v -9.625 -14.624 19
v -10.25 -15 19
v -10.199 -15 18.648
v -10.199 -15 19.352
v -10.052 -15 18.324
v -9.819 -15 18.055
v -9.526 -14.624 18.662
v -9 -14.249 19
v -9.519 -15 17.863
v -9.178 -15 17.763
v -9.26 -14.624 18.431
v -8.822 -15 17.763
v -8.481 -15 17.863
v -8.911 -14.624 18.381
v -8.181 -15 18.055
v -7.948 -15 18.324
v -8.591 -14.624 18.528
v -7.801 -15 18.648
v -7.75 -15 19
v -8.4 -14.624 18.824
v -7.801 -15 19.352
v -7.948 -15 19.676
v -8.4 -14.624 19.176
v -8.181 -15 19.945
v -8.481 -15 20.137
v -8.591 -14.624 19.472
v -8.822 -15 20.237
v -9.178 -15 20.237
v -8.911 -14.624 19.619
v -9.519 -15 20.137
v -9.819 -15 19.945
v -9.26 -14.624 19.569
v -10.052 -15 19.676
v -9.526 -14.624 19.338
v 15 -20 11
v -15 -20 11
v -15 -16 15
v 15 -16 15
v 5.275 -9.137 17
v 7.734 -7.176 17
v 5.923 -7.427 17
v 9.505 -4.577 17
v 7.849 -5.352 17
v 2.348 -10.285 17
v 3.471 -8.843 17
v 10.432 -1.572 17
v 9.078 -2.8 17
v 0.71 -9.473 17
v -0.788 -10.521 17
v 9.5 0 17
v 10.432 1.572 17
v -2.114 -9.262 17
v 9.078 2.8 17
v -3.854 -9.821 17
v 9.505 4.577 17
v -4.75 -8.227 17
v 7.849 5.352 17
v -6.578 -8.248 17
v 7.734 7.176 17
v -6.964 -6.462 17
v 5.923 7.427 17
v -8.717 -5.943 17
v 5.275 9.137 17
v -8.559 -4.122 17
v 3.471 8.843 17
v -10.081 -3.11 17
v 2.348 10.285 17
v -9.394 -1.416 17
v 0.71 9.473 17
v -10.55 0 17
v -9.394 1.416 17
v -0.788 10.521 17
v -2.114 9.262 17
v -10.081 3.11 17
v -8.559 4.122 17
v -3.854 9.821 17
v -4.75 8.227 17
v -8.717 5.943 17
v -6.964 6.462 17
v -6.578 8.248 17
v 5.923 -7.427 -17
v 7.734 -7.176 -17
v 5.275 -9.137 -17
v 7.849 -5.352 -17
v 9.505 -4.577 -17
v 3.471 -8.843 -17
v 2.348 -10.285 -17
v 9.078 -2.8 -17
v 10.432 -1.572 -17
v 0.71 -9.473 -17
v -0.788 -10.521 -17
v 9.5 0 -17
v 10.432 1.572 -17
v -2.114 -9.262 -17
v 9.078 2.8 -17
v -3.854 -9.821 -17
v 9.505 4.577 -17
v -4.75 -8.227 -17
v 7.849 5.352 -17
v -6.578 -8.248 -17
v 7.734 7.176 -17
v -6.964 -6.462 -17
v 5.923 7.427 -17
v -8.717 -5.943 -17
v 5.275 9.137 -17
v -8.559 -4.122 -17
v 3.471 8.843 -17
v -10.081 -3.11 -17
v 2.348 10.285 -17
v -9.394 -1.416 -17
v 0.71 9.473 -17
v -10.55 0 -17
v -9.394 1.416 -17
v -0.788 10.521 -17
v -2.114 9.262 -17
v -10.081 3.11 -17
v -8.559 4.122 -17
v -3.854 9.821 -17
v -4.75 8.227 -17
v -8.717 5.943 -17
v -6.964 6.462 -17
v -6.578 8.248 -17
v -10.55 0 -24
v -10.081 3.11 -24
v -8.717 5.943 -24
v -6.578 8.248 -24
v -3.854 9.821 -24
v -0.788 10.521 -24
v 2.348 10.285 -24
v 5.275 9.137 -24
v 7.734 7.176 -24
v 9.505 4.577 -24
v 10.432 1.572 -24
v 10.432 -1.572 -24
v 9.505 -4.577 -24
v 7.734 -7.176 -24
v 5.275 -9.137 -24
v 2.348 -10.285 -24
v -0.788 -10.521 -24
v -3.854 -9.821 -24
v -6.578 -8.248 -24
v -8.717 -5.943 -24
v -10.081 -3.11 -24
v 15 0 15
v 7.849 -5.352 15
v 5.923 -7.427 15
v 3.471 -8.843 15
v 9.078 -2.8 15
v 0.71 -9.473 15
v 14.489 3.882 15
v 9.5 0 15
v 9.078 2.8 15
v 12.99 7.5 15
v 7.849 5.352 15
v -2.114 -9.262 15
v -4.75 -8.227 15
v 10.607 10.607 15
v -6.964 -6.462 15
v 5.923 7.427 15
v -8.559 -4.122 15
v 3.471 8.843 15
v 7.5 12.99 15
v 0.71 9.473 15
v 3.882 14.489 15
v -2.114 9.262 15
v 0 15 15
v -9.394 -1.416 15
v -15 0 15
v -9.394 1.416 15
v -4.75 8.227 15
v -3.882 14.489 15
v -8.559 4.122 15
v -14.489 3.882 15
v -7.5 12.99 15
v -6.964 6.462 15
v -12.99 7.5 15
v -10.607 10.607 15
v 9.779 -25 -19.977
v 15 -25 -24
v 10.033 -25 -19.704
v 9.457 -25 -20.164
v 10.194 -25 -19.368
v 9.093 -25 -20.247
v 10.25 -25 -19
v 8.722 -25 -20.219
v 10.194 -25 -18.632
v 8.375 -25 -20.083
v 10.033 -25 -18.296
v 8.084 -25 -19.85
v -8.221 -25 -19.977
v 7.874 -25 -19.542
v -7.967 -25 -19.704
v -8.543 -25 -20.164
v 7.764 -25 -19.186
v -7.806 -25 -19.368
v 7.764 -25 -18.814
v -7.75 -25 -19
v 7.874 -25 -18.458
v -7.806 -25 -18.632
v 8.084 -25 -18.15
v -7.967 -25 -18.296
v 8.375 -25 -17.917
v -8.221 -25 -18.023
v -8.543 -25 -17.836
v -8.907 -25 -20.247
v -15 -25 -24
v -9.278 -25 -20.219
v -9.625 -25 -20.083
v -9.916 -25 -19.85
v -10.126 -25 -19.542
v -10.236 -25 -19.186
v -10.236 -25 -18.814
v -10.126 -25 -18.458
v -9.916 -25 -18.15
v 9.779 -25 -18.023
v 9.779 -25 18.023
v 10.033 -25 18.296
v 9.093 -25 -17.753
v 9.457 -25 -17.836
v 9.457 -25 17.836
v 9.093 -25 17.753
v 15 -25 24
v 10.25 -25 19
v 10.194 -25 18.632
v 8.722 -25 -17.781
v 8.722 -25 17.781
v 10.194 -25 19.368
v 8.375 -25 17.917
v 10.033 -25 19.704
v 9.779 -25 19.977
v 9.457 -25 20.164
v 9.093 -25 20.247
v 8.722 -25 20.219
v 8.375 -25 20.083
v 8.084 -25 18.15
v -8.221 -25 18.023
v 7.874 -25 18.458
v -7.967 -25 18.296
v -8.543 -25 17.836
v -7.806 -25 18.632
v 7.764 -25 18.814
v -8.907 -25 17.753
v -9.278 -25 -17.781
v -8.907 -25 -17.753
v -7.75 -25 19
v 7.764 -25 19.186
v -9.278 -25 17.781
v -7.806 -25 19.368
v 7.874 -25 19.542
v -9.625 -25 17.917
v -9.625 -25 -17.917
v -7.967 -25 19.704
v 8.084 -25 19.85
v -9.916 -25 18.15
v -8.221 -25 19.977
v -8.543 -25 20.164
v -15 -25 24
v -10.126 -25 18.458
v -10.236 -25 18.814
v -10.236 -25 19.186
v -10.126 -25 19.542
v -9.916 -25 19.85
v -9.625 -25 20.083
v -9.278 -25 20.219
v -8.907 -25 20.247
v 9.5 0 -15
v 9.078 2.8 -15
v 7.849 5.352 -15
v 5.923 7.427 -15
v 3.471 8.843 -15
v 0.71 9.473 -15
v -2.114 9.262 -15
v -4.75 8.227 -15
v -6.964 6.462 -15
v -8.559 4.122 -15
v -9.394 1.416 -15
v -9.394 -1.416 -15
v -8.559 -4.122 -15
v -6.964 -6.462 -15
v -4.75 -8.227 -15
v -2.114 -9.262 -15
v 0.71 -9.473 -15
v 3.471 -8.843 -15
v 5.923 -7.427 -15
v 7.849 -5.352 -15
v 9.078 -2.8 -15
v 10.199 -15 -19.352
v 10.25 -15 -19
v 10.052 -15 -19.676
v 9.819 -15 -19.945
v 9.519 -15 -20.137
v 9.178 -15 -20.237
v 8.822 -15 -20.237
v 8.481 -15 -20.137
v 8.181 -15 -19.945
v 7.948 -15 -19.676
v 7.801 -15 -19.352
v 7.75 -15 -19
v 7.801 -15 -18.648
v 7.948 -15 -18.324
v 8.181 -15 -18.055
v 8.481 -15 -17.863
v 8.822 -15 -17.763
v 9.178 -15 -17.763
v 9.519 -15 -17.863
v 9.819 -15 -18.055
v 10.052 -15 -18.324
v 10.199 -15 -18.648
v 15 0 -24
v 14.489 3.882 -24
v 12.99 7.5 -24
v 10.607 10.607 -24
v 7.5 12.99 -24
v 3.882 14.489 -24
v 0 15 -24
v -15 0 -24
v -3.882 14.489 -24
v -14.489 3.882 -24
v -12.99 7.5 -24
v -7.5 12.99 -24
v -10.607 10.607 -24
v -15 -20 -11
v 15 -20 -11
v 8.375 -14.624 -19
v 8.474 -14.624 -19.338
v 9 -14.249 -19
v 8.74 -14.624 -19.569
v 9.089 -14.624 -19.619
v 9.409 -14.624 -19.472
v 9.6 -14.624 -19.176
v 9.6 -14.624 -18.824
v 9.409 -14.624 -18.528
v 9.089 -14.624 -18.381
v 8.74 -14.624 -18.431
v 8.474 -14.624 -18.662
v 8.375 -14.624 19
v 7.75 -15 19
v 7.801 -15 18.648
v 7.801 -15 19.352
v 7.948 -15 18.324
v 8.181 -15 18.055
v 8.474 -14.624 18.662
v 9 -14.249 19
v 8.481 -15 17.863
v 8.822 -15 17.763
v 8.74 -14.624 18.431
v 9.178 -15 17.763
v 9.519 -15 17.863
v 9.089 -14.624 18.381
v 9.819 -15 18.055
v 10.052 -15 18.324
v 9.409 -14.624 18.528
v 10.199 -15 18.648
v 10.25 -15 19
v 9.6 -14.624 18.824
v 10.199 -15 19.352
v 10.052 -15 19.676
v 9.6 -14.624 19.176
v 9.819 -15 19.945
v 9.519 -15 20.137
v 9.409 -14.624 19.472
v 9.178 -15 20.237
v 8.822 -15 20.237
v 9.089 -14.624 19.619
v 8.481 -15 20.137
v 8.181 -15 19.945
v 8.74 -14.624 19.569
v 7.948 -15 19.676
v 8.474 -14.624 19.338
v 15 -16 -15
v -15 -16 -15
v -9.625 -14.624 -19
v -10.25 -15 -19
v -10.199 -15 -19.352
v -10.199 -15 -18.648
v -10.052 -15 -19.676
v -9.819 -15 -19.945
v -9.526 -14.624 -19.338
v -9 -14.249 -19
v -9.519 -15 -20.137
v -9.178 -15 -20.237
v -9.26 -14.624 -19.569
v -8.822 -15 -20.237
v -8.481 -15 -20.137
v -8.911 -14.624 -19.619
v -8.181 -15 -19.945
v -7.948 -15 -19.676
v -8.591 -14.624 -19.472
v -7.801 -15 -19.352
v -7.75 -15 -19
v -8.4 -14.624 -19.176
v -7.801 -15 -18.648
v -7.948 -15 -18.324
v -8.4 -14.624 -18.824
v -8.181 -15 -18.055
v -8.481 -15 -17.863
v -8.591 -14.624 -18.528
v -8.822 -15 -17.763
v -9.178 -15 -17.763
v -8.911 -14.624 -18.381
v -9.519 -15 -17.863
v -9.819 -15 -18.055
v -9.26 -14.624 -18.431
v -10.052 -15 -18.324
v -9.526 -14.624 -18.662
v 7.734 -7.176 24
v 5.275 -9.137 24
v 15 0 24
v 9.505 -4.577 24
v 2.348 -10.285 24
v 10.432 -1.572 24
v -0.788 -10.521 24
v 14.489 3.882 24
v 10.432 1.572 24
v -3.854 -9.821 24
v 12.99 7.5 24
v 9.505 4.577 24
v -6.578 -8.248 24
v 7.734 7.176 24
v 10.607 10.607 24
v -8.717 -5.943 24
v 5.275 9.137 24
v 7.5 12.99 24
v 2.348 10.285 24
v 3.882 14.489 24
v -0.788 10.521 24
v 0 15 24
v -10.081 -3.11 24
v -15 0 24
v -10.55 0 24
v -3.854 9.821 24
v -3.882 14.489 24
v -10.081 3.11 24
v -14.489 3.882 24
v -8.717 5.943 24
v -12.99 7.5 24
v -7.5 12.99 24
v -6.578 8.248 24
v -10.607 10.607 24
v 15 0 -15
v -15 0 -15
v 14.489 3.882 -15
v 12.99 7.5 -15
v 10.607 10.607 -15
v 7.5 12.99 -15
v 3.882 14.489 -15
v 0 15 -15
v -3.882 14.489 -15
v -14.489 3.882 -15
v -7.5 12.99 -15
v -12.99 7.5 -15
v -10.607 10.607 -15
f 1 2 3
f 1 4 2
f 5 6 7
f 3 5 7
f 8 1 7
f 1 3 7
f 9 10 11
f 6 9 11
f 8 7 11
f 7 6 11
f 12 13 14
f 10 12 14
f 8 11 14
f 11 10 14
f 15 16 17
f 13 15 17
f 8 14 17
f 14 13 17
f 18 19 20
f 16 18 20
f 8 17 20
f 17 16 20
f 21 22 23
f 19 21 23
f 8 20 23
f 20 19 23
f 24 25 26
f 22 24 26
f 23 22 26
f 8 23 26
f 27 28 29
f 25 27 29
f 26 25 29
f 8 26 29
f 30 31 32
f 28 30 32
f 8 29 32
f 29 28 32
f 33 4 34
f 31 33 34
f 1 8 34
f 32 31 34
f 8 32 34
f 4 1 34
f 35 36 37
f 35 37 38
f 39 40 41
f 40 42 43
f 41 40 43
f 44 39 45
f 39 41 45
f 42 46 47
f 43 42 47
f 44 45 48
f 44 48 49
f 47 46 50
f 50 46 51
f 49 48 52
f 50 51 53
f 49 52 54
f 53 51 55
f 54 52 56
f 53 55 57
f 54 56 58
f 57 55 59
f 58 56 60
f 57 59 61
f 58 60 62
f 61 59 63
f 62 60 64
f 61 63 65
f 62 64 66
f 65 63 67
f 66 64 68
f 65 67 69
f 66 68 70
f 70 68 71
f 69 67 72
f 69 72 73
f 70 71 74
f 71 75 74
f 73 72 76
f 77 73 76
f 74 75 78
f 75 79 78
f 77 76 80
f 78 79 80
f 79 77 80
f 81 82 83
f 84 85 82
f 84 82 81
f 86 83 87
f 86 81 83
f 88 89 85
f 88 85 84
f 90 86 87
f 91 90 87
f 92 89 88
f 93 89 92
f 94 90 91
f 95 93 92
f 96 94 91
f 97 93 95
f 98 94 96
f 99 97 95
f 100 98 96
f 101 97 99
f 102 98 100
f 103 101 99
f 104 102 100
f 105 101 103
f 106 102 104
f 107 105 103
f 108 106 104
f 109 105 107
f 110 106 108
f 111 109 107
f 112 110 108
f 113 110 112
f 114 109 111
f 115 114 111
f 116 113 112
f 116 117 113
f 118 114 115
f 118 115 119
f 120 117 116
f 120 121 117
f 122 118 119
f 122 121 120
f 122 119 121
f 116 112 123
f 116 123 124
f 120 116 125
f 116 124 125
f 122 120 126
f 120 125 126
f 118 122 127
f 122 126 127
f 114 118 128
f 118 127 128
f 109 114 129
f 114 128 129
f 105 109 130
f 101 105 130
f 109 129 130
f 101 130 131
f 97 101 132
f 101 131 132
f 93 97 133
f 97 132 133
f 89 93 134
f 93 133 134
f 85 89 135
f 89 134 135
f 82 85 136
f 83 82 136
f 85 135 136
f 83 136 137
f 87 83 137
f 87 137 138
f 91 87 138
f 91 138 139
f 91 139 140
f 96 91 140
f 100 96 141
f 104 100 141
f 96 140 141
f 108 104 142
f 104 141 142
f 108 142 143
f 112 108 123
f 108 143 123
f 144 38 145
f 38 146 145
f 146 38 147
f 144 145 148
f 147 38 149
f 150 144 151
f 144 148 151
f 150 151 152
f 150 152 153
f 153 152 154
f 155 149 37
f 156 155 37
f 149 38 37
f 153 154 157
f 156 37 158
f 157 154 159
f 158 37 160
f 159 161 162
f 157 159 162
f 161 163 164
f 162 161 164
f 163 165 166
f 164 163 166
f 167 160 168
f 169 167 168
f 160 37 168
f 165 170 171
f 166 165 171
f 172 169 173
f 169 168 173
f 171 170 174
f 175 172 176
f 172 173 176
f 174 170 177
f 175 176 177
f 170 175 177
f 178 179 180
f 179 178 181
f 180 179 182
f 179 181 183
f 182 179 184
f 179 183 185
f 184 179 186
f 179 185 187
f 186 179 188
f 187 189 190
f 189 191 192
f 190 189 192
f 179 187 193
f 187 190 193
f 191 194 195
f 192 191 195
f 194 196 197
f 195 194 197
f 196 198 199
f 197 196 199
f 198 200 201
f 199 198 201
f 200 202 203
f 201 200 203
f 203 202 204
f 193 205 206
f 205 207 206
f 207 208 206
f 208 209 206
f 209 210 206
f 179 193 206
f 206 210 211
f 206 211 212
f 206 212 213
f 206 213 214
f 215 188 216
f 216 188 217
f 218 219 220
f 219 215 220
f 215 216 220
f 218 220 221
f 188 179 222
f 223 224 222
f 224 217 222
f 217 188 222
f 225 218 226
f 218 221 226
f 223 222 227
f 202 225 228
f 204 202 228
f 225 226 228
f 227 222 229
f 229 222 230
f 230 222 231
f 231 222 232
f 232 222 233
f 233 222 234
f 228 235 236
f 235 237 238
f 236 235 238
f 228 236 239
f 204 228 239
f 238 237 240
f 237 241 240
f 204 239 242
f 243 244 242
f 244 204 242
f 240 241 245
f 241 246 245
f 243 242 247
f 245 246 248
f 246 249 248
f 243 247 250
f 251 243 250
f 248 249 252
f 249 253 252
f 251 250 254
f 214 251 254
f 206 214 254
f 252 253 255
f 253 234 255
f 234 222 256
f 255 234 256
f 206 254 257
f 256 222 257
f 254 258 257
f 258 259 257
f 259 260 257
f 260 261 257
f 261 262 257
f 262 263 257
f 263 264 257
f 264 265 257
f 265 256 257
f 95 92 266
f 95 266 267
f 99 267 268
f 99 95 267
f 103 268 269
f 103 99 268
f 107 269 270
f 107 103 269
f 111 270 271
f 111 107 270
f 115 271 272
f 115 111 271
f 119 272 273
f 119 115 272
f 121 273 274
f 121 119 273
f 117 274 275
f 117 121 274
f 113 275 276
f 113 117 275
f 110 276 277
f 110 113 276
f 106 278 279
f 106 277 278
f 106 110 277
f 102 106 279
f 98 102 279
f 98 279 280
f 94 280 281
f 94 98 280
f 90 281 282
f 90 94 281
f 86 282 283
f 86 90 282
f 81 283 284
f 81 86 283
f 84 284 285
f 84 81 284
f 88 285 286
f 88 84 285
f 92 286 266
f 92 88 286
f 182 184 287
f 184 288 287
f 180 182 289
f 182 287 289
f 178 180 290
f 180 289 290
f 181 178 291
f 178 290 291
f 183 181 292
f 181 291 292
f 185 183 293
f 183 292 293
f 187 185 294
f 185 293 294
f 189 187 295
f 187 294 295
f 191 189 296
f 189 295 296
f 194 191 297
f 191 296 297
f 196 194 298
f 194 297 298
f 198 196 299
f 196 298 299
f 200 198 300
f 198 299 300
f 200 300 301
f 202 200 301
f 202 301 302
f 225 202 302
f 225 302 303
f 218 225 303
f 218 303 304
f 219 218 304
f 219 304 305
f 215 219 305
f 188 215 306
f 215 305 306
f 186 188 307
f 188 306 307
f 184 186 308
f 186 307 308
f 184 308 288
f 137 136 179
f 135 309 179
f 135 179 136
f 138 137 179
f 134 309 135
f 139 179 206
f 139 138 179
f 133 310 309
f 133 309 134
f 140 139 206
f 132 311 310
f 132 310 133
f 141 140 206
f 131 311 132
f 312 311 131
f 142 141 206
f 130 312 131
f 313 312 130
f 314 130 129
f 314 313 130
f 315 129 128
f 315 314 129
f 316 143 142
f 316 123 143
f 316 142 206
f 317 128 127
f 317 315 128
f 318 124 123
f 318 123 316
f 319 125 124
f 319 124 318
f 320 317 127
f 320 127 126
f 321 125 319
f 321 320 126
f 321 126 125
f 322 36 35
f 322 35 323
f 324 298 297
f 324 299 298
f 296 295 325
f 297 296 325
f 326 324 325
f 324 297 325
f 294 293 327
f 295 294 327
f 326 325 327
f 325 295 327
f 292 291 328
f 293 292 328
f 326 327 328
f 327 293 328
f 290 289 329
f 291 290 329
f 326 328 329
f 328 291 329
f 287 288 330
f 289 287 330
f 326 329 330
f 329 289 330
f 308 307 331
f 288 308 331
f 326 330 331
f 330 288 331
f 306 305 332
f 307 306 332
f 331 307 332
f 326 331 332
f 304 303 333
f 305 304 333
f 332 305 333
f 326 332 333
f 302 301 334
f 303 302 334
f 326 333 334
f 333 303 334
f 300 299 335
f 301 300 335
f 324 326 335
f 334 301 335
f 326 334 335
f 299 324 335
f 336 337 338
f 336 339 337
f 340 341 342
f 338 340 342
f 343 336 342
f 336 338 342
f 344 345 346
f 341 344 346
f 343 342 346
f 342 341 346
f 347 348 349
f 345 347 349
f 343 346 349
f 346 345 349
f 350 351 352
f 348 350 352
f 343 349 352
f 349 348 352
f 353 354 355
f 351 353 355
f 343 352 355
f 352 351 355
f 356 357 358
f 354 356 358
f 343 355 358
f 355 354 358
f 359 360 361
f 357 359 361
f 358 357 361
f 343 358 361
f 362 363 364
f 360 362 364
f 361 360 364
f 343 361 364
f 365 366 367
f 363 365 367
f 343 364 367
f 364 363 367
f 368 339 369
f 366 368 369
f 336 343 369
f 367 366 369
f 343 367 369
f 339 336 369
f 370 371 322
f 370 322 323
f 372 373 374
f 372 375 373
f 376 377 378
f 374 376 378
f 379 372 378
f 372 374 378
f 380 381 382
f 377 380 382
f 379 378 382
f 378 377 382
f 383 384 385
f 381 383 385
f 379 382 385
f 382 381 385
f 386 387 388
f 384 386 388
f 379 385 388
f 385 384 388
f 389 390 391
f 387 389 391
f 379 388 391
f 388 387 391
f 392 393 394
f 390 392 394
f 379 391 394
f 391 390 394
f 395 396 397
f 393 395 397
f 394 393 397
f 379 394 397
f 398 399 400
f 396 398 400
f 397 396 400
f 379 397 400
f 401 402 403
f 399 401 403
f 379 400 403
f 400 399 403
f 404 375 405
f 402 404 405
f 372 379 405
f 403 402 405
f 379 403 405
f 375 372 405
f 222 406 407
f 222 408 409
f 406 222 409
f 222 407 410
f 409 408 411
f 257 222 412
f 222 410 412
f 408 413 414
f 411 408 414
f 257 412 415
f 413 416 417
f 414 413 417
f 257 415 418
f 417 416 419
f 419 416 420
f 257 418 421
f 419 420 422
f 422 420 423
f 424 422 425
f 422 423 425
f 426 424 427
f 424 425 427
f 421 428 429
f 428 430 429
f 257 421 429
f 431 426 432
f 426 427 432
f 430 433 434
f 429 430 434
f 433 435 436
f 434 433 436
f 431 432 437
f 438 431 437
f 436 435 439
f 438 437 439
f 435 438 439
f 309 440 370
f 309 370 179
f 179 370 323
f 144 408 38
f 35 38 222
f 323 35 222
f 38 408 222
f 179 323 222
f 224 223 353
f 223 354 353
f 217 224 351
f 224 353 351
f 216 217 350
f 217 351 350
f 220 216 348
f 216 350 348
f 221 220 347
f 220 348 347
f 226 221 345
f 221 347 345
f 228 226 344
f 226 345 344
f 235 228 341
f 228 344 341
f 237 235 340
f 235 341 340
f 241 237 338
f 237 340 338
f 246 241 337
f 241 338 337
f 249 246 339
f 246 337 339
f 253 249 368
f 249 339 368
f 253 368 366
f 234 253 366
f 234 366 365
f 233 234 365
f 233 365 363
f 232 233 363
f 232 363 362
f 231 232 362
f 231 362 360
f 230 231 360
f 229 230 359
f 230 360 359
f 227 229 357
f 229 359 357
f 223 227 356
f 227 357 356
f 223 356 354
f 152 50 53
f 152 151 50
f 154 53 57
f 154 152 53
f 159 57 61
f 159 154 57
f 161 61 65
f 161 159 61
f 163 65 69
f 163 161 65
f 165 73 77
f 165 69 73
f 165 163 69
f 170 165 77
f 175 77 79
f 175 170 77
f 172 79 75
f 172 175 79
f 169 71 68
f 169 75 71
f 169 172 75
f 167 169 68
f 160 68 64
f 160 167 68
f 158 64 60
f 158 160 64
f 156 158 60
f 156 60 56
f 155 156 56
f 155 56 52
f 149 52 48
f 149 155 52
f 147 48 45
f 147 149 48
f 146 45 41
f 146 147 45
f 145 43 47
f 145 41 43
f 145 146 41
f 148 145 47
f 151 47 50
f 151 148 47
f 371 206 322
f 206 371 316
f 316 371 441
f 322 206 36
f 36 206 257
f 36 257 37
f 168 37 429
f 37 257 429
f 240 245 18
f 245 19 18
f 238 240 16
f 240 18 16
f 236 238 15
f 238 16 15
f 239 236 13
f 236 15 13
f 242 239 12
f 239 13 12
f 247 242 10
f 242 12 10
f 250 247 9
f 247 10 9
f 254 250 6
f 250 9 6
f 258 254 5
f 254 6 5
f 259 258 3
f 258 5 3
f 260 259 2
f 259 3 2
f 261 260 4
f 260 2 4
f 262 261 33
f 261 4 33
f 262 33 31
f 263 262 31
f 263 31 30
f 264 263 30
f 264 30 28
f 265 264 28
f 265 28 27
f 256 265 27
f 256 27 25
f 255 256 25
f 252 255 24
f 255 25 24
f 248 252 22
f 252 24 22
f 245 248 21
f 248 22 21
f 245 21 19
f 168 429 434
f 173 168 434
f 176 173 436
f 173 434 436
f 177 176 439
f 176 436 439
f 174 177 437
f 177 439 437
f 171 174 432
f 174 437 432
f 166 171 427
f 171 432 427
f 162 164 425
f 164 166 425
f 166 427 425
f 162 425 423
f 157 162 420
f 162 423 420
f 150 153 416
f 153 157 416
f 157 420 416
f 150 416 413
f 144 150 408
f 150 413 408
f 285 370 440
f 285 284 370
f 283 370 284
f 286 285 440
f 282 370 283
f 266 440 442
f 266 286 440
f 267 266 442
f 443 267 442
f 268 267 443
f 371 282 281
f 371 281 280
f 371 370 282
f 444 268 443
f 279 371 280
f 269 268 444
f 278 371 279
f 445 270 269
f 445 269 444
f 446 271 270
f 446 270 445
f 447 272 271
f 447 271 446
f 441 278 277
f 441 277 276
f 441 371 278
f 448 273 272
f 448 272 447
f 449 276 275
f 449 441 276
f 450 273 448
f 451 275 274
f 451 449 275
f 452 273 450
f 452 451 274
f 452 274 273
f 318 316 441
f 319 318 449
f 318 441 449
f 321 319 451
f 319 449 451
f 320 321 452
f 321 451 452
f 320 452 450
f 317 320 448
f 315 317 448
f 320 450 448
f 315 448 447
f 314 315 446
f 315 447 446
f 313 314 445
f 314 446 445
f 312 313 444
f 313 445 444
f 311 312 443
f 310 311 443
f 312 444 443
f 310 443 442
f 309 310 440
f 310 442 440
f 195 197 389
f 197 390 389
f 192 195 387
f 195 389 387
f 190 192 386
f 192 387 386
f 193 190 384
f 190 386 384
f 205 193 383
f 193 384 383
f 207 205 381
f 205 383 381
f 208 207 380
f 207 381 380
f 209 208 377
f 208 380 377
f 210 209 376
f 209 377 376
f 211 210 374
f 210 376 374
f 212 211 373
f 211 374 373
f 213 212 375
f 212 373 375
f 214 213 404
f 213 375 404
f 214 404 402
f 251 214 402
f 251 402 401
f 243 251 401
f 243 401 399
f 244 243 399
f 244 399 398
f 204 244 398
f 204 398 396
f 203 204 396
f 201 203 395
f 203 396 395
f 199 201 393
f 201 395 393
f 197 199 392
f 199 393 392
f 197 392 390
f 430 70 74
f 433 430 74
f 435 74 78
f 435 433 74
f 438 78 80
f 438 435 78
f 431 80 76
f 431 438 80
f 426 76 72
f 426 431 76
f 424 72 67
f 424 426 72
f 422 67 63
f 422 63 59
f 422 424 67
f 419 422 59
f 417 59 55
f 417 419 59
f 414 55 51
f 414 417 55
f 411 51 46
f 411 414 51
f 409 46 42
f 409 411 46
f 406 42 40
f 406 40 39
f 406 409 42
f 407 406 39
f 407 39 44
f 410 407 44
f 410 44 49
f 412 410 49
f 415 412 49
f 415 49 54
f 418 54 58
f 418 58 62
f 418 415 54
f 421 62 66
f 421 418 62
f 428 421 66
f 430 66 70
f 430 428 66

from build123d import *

# Parameters (mm, degrees)
SKETCH_1_R               = 9.5
EXTRUDE_1_DEPTH          = 24
CUT_EXTRUDE_1_DEPTH      = 38.762415177
CUT_EXTRUDE_1_DEPTH_BACK = 38.762415177
SKETCH_2_W               = 30
SKETCH_2_H               = 69.949963181
SKETCH_4_R               = 10.55
CUT_EXTRUDE_3_DEPTH      = 7
CHAMFER_2_SIZE           = 4
HOLE_WIZARD_M3_1_D       = 2.5
HOLE_WIZARD_M3_1_DEPTH   = 10
HOLE_WIZARD_M3_1_TIP     = 0.751075774


with BuildPart() as part:
    # 草图1 → 凸台-拉伸1 (new, symmetric)
    with BuildSketch(Plane.XY):
        with BuildLine():
            Line((-15, -25), (-15, 0))
            ThreePointArc((-15, 0), (0, 15), (15, 0))
            Line((15, 0), (15, -25))
            Line((15, -25), (-15, -25))
        make_face()
        Circle(SKETCH_1_R, mode=Mode.SUBTRACT)
    extrude(amount=EXTRUDE_1_DEPTH, both=True)

    # 草图2 → 切除-拉伸1 (cut, two sides: drawn at the far end of the back side and taken through both)
    with BuildSketch(Plane(origin=(0, 0, 0), x_dir=(0, 0, -1), z_dir=(1, 0, 0)).offset(-CUT_EXTRUDE_1_DEPTH_BACK)):
        with Locations((0, 14.974981591)):
            Rectangle(SKETCH_2_W, SKETCH_2_H)
    extrude(amount=CUT_EXTRUDE_1_DEPTH + CUT_EXTRUDE_1_DEPTH_BACK, mode=Mode.SUBTRACT)

    # 草图4 → 切除-拉伸3 (cut)
    with BuildSketch(Plane(origin=(0, 0, -24), x_dir=(-1, 0, 0), z_dir=(0, 0, -1))):
        Circle(SKETCH_4_R)
    cut_extrude_3 = extrude(amount=-CUT_EXTRUDE_3_DEPTH, mode=Mode.SUBTRACT)

    # 倒角2
    chamfer_2_edges = [part.edges().sort_by_distance(p)[0] for p in [
        (0, -20, 15),
        (0, -20, -15),
    ]]
    chamfer(chamfer_2_edges, length=CHAMFER_2_SIZE)

    # M3 螺纹孔1
    with Locations(Plane(origin=(0, -25, 0), x_dir=(-1, 0, 0), z_dir=(0, -1, 0))):
        with Locations((9, -19), (-9, -19), (9, 19), (-9, 19)):
            Hole(HOLE_WIZARD_M3_1_D / 2, depth=HOLE_WIZARD_M3_1_DEPTH)
            with Locations((0, 0, -(HOLE_WIZARD_M3_1_DEPTH + HOLE_WIZARD_M3_1_TIP / 2))):  # 118° drill point
                Cone(0, HOLE_WIZARD_M3_1_D / 2, HOLE_WIZARD_M3_1_TIP, mode=Mode.SUBTRACT)

    # 镜向1: 切除-拉伸3 across plane
    add(cut_extrude_3.mirror(Plane.XY), mode=Mode.SUBTRACT)


solid = part.part
